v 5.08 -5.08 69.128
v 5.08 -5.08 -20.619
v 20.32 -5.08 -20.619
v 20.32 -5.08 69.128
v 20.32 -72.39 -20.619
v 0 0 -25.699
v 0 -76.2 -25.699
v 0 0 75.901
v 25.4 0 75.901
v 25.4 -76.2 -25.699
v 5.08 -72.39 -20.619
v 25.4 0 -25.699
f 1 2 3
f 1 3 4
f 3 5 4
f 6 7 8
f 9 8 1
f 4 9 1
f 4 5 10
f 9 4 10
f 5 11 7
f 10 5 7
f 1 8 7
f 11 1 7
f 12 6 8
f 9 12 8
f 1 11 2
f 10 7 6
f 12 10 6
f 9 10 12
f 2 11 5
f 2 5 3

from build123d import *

# Parameters (mm, degrees)
F1_DEPTH = 25.4
F2_T     = -5.08


with BuildPart() as f1:
    # F0 (on Right) → F1 (new body)
    with BuildSketch(Plane.YZ):
        Polygon((-76.2, -25.698823), (0, -25.698823), (0, 75.901177), align=None)
    extrude(amount=F1_DEPTH)

    # F2
    f2_openings = [f1.faces().sort_by_distance(p)[0] for p in [
        (12.7, -38.1, 25.101177),
    ]]
    offset(amount=F2_T, openings=f2_openings)


solid = f1.part
